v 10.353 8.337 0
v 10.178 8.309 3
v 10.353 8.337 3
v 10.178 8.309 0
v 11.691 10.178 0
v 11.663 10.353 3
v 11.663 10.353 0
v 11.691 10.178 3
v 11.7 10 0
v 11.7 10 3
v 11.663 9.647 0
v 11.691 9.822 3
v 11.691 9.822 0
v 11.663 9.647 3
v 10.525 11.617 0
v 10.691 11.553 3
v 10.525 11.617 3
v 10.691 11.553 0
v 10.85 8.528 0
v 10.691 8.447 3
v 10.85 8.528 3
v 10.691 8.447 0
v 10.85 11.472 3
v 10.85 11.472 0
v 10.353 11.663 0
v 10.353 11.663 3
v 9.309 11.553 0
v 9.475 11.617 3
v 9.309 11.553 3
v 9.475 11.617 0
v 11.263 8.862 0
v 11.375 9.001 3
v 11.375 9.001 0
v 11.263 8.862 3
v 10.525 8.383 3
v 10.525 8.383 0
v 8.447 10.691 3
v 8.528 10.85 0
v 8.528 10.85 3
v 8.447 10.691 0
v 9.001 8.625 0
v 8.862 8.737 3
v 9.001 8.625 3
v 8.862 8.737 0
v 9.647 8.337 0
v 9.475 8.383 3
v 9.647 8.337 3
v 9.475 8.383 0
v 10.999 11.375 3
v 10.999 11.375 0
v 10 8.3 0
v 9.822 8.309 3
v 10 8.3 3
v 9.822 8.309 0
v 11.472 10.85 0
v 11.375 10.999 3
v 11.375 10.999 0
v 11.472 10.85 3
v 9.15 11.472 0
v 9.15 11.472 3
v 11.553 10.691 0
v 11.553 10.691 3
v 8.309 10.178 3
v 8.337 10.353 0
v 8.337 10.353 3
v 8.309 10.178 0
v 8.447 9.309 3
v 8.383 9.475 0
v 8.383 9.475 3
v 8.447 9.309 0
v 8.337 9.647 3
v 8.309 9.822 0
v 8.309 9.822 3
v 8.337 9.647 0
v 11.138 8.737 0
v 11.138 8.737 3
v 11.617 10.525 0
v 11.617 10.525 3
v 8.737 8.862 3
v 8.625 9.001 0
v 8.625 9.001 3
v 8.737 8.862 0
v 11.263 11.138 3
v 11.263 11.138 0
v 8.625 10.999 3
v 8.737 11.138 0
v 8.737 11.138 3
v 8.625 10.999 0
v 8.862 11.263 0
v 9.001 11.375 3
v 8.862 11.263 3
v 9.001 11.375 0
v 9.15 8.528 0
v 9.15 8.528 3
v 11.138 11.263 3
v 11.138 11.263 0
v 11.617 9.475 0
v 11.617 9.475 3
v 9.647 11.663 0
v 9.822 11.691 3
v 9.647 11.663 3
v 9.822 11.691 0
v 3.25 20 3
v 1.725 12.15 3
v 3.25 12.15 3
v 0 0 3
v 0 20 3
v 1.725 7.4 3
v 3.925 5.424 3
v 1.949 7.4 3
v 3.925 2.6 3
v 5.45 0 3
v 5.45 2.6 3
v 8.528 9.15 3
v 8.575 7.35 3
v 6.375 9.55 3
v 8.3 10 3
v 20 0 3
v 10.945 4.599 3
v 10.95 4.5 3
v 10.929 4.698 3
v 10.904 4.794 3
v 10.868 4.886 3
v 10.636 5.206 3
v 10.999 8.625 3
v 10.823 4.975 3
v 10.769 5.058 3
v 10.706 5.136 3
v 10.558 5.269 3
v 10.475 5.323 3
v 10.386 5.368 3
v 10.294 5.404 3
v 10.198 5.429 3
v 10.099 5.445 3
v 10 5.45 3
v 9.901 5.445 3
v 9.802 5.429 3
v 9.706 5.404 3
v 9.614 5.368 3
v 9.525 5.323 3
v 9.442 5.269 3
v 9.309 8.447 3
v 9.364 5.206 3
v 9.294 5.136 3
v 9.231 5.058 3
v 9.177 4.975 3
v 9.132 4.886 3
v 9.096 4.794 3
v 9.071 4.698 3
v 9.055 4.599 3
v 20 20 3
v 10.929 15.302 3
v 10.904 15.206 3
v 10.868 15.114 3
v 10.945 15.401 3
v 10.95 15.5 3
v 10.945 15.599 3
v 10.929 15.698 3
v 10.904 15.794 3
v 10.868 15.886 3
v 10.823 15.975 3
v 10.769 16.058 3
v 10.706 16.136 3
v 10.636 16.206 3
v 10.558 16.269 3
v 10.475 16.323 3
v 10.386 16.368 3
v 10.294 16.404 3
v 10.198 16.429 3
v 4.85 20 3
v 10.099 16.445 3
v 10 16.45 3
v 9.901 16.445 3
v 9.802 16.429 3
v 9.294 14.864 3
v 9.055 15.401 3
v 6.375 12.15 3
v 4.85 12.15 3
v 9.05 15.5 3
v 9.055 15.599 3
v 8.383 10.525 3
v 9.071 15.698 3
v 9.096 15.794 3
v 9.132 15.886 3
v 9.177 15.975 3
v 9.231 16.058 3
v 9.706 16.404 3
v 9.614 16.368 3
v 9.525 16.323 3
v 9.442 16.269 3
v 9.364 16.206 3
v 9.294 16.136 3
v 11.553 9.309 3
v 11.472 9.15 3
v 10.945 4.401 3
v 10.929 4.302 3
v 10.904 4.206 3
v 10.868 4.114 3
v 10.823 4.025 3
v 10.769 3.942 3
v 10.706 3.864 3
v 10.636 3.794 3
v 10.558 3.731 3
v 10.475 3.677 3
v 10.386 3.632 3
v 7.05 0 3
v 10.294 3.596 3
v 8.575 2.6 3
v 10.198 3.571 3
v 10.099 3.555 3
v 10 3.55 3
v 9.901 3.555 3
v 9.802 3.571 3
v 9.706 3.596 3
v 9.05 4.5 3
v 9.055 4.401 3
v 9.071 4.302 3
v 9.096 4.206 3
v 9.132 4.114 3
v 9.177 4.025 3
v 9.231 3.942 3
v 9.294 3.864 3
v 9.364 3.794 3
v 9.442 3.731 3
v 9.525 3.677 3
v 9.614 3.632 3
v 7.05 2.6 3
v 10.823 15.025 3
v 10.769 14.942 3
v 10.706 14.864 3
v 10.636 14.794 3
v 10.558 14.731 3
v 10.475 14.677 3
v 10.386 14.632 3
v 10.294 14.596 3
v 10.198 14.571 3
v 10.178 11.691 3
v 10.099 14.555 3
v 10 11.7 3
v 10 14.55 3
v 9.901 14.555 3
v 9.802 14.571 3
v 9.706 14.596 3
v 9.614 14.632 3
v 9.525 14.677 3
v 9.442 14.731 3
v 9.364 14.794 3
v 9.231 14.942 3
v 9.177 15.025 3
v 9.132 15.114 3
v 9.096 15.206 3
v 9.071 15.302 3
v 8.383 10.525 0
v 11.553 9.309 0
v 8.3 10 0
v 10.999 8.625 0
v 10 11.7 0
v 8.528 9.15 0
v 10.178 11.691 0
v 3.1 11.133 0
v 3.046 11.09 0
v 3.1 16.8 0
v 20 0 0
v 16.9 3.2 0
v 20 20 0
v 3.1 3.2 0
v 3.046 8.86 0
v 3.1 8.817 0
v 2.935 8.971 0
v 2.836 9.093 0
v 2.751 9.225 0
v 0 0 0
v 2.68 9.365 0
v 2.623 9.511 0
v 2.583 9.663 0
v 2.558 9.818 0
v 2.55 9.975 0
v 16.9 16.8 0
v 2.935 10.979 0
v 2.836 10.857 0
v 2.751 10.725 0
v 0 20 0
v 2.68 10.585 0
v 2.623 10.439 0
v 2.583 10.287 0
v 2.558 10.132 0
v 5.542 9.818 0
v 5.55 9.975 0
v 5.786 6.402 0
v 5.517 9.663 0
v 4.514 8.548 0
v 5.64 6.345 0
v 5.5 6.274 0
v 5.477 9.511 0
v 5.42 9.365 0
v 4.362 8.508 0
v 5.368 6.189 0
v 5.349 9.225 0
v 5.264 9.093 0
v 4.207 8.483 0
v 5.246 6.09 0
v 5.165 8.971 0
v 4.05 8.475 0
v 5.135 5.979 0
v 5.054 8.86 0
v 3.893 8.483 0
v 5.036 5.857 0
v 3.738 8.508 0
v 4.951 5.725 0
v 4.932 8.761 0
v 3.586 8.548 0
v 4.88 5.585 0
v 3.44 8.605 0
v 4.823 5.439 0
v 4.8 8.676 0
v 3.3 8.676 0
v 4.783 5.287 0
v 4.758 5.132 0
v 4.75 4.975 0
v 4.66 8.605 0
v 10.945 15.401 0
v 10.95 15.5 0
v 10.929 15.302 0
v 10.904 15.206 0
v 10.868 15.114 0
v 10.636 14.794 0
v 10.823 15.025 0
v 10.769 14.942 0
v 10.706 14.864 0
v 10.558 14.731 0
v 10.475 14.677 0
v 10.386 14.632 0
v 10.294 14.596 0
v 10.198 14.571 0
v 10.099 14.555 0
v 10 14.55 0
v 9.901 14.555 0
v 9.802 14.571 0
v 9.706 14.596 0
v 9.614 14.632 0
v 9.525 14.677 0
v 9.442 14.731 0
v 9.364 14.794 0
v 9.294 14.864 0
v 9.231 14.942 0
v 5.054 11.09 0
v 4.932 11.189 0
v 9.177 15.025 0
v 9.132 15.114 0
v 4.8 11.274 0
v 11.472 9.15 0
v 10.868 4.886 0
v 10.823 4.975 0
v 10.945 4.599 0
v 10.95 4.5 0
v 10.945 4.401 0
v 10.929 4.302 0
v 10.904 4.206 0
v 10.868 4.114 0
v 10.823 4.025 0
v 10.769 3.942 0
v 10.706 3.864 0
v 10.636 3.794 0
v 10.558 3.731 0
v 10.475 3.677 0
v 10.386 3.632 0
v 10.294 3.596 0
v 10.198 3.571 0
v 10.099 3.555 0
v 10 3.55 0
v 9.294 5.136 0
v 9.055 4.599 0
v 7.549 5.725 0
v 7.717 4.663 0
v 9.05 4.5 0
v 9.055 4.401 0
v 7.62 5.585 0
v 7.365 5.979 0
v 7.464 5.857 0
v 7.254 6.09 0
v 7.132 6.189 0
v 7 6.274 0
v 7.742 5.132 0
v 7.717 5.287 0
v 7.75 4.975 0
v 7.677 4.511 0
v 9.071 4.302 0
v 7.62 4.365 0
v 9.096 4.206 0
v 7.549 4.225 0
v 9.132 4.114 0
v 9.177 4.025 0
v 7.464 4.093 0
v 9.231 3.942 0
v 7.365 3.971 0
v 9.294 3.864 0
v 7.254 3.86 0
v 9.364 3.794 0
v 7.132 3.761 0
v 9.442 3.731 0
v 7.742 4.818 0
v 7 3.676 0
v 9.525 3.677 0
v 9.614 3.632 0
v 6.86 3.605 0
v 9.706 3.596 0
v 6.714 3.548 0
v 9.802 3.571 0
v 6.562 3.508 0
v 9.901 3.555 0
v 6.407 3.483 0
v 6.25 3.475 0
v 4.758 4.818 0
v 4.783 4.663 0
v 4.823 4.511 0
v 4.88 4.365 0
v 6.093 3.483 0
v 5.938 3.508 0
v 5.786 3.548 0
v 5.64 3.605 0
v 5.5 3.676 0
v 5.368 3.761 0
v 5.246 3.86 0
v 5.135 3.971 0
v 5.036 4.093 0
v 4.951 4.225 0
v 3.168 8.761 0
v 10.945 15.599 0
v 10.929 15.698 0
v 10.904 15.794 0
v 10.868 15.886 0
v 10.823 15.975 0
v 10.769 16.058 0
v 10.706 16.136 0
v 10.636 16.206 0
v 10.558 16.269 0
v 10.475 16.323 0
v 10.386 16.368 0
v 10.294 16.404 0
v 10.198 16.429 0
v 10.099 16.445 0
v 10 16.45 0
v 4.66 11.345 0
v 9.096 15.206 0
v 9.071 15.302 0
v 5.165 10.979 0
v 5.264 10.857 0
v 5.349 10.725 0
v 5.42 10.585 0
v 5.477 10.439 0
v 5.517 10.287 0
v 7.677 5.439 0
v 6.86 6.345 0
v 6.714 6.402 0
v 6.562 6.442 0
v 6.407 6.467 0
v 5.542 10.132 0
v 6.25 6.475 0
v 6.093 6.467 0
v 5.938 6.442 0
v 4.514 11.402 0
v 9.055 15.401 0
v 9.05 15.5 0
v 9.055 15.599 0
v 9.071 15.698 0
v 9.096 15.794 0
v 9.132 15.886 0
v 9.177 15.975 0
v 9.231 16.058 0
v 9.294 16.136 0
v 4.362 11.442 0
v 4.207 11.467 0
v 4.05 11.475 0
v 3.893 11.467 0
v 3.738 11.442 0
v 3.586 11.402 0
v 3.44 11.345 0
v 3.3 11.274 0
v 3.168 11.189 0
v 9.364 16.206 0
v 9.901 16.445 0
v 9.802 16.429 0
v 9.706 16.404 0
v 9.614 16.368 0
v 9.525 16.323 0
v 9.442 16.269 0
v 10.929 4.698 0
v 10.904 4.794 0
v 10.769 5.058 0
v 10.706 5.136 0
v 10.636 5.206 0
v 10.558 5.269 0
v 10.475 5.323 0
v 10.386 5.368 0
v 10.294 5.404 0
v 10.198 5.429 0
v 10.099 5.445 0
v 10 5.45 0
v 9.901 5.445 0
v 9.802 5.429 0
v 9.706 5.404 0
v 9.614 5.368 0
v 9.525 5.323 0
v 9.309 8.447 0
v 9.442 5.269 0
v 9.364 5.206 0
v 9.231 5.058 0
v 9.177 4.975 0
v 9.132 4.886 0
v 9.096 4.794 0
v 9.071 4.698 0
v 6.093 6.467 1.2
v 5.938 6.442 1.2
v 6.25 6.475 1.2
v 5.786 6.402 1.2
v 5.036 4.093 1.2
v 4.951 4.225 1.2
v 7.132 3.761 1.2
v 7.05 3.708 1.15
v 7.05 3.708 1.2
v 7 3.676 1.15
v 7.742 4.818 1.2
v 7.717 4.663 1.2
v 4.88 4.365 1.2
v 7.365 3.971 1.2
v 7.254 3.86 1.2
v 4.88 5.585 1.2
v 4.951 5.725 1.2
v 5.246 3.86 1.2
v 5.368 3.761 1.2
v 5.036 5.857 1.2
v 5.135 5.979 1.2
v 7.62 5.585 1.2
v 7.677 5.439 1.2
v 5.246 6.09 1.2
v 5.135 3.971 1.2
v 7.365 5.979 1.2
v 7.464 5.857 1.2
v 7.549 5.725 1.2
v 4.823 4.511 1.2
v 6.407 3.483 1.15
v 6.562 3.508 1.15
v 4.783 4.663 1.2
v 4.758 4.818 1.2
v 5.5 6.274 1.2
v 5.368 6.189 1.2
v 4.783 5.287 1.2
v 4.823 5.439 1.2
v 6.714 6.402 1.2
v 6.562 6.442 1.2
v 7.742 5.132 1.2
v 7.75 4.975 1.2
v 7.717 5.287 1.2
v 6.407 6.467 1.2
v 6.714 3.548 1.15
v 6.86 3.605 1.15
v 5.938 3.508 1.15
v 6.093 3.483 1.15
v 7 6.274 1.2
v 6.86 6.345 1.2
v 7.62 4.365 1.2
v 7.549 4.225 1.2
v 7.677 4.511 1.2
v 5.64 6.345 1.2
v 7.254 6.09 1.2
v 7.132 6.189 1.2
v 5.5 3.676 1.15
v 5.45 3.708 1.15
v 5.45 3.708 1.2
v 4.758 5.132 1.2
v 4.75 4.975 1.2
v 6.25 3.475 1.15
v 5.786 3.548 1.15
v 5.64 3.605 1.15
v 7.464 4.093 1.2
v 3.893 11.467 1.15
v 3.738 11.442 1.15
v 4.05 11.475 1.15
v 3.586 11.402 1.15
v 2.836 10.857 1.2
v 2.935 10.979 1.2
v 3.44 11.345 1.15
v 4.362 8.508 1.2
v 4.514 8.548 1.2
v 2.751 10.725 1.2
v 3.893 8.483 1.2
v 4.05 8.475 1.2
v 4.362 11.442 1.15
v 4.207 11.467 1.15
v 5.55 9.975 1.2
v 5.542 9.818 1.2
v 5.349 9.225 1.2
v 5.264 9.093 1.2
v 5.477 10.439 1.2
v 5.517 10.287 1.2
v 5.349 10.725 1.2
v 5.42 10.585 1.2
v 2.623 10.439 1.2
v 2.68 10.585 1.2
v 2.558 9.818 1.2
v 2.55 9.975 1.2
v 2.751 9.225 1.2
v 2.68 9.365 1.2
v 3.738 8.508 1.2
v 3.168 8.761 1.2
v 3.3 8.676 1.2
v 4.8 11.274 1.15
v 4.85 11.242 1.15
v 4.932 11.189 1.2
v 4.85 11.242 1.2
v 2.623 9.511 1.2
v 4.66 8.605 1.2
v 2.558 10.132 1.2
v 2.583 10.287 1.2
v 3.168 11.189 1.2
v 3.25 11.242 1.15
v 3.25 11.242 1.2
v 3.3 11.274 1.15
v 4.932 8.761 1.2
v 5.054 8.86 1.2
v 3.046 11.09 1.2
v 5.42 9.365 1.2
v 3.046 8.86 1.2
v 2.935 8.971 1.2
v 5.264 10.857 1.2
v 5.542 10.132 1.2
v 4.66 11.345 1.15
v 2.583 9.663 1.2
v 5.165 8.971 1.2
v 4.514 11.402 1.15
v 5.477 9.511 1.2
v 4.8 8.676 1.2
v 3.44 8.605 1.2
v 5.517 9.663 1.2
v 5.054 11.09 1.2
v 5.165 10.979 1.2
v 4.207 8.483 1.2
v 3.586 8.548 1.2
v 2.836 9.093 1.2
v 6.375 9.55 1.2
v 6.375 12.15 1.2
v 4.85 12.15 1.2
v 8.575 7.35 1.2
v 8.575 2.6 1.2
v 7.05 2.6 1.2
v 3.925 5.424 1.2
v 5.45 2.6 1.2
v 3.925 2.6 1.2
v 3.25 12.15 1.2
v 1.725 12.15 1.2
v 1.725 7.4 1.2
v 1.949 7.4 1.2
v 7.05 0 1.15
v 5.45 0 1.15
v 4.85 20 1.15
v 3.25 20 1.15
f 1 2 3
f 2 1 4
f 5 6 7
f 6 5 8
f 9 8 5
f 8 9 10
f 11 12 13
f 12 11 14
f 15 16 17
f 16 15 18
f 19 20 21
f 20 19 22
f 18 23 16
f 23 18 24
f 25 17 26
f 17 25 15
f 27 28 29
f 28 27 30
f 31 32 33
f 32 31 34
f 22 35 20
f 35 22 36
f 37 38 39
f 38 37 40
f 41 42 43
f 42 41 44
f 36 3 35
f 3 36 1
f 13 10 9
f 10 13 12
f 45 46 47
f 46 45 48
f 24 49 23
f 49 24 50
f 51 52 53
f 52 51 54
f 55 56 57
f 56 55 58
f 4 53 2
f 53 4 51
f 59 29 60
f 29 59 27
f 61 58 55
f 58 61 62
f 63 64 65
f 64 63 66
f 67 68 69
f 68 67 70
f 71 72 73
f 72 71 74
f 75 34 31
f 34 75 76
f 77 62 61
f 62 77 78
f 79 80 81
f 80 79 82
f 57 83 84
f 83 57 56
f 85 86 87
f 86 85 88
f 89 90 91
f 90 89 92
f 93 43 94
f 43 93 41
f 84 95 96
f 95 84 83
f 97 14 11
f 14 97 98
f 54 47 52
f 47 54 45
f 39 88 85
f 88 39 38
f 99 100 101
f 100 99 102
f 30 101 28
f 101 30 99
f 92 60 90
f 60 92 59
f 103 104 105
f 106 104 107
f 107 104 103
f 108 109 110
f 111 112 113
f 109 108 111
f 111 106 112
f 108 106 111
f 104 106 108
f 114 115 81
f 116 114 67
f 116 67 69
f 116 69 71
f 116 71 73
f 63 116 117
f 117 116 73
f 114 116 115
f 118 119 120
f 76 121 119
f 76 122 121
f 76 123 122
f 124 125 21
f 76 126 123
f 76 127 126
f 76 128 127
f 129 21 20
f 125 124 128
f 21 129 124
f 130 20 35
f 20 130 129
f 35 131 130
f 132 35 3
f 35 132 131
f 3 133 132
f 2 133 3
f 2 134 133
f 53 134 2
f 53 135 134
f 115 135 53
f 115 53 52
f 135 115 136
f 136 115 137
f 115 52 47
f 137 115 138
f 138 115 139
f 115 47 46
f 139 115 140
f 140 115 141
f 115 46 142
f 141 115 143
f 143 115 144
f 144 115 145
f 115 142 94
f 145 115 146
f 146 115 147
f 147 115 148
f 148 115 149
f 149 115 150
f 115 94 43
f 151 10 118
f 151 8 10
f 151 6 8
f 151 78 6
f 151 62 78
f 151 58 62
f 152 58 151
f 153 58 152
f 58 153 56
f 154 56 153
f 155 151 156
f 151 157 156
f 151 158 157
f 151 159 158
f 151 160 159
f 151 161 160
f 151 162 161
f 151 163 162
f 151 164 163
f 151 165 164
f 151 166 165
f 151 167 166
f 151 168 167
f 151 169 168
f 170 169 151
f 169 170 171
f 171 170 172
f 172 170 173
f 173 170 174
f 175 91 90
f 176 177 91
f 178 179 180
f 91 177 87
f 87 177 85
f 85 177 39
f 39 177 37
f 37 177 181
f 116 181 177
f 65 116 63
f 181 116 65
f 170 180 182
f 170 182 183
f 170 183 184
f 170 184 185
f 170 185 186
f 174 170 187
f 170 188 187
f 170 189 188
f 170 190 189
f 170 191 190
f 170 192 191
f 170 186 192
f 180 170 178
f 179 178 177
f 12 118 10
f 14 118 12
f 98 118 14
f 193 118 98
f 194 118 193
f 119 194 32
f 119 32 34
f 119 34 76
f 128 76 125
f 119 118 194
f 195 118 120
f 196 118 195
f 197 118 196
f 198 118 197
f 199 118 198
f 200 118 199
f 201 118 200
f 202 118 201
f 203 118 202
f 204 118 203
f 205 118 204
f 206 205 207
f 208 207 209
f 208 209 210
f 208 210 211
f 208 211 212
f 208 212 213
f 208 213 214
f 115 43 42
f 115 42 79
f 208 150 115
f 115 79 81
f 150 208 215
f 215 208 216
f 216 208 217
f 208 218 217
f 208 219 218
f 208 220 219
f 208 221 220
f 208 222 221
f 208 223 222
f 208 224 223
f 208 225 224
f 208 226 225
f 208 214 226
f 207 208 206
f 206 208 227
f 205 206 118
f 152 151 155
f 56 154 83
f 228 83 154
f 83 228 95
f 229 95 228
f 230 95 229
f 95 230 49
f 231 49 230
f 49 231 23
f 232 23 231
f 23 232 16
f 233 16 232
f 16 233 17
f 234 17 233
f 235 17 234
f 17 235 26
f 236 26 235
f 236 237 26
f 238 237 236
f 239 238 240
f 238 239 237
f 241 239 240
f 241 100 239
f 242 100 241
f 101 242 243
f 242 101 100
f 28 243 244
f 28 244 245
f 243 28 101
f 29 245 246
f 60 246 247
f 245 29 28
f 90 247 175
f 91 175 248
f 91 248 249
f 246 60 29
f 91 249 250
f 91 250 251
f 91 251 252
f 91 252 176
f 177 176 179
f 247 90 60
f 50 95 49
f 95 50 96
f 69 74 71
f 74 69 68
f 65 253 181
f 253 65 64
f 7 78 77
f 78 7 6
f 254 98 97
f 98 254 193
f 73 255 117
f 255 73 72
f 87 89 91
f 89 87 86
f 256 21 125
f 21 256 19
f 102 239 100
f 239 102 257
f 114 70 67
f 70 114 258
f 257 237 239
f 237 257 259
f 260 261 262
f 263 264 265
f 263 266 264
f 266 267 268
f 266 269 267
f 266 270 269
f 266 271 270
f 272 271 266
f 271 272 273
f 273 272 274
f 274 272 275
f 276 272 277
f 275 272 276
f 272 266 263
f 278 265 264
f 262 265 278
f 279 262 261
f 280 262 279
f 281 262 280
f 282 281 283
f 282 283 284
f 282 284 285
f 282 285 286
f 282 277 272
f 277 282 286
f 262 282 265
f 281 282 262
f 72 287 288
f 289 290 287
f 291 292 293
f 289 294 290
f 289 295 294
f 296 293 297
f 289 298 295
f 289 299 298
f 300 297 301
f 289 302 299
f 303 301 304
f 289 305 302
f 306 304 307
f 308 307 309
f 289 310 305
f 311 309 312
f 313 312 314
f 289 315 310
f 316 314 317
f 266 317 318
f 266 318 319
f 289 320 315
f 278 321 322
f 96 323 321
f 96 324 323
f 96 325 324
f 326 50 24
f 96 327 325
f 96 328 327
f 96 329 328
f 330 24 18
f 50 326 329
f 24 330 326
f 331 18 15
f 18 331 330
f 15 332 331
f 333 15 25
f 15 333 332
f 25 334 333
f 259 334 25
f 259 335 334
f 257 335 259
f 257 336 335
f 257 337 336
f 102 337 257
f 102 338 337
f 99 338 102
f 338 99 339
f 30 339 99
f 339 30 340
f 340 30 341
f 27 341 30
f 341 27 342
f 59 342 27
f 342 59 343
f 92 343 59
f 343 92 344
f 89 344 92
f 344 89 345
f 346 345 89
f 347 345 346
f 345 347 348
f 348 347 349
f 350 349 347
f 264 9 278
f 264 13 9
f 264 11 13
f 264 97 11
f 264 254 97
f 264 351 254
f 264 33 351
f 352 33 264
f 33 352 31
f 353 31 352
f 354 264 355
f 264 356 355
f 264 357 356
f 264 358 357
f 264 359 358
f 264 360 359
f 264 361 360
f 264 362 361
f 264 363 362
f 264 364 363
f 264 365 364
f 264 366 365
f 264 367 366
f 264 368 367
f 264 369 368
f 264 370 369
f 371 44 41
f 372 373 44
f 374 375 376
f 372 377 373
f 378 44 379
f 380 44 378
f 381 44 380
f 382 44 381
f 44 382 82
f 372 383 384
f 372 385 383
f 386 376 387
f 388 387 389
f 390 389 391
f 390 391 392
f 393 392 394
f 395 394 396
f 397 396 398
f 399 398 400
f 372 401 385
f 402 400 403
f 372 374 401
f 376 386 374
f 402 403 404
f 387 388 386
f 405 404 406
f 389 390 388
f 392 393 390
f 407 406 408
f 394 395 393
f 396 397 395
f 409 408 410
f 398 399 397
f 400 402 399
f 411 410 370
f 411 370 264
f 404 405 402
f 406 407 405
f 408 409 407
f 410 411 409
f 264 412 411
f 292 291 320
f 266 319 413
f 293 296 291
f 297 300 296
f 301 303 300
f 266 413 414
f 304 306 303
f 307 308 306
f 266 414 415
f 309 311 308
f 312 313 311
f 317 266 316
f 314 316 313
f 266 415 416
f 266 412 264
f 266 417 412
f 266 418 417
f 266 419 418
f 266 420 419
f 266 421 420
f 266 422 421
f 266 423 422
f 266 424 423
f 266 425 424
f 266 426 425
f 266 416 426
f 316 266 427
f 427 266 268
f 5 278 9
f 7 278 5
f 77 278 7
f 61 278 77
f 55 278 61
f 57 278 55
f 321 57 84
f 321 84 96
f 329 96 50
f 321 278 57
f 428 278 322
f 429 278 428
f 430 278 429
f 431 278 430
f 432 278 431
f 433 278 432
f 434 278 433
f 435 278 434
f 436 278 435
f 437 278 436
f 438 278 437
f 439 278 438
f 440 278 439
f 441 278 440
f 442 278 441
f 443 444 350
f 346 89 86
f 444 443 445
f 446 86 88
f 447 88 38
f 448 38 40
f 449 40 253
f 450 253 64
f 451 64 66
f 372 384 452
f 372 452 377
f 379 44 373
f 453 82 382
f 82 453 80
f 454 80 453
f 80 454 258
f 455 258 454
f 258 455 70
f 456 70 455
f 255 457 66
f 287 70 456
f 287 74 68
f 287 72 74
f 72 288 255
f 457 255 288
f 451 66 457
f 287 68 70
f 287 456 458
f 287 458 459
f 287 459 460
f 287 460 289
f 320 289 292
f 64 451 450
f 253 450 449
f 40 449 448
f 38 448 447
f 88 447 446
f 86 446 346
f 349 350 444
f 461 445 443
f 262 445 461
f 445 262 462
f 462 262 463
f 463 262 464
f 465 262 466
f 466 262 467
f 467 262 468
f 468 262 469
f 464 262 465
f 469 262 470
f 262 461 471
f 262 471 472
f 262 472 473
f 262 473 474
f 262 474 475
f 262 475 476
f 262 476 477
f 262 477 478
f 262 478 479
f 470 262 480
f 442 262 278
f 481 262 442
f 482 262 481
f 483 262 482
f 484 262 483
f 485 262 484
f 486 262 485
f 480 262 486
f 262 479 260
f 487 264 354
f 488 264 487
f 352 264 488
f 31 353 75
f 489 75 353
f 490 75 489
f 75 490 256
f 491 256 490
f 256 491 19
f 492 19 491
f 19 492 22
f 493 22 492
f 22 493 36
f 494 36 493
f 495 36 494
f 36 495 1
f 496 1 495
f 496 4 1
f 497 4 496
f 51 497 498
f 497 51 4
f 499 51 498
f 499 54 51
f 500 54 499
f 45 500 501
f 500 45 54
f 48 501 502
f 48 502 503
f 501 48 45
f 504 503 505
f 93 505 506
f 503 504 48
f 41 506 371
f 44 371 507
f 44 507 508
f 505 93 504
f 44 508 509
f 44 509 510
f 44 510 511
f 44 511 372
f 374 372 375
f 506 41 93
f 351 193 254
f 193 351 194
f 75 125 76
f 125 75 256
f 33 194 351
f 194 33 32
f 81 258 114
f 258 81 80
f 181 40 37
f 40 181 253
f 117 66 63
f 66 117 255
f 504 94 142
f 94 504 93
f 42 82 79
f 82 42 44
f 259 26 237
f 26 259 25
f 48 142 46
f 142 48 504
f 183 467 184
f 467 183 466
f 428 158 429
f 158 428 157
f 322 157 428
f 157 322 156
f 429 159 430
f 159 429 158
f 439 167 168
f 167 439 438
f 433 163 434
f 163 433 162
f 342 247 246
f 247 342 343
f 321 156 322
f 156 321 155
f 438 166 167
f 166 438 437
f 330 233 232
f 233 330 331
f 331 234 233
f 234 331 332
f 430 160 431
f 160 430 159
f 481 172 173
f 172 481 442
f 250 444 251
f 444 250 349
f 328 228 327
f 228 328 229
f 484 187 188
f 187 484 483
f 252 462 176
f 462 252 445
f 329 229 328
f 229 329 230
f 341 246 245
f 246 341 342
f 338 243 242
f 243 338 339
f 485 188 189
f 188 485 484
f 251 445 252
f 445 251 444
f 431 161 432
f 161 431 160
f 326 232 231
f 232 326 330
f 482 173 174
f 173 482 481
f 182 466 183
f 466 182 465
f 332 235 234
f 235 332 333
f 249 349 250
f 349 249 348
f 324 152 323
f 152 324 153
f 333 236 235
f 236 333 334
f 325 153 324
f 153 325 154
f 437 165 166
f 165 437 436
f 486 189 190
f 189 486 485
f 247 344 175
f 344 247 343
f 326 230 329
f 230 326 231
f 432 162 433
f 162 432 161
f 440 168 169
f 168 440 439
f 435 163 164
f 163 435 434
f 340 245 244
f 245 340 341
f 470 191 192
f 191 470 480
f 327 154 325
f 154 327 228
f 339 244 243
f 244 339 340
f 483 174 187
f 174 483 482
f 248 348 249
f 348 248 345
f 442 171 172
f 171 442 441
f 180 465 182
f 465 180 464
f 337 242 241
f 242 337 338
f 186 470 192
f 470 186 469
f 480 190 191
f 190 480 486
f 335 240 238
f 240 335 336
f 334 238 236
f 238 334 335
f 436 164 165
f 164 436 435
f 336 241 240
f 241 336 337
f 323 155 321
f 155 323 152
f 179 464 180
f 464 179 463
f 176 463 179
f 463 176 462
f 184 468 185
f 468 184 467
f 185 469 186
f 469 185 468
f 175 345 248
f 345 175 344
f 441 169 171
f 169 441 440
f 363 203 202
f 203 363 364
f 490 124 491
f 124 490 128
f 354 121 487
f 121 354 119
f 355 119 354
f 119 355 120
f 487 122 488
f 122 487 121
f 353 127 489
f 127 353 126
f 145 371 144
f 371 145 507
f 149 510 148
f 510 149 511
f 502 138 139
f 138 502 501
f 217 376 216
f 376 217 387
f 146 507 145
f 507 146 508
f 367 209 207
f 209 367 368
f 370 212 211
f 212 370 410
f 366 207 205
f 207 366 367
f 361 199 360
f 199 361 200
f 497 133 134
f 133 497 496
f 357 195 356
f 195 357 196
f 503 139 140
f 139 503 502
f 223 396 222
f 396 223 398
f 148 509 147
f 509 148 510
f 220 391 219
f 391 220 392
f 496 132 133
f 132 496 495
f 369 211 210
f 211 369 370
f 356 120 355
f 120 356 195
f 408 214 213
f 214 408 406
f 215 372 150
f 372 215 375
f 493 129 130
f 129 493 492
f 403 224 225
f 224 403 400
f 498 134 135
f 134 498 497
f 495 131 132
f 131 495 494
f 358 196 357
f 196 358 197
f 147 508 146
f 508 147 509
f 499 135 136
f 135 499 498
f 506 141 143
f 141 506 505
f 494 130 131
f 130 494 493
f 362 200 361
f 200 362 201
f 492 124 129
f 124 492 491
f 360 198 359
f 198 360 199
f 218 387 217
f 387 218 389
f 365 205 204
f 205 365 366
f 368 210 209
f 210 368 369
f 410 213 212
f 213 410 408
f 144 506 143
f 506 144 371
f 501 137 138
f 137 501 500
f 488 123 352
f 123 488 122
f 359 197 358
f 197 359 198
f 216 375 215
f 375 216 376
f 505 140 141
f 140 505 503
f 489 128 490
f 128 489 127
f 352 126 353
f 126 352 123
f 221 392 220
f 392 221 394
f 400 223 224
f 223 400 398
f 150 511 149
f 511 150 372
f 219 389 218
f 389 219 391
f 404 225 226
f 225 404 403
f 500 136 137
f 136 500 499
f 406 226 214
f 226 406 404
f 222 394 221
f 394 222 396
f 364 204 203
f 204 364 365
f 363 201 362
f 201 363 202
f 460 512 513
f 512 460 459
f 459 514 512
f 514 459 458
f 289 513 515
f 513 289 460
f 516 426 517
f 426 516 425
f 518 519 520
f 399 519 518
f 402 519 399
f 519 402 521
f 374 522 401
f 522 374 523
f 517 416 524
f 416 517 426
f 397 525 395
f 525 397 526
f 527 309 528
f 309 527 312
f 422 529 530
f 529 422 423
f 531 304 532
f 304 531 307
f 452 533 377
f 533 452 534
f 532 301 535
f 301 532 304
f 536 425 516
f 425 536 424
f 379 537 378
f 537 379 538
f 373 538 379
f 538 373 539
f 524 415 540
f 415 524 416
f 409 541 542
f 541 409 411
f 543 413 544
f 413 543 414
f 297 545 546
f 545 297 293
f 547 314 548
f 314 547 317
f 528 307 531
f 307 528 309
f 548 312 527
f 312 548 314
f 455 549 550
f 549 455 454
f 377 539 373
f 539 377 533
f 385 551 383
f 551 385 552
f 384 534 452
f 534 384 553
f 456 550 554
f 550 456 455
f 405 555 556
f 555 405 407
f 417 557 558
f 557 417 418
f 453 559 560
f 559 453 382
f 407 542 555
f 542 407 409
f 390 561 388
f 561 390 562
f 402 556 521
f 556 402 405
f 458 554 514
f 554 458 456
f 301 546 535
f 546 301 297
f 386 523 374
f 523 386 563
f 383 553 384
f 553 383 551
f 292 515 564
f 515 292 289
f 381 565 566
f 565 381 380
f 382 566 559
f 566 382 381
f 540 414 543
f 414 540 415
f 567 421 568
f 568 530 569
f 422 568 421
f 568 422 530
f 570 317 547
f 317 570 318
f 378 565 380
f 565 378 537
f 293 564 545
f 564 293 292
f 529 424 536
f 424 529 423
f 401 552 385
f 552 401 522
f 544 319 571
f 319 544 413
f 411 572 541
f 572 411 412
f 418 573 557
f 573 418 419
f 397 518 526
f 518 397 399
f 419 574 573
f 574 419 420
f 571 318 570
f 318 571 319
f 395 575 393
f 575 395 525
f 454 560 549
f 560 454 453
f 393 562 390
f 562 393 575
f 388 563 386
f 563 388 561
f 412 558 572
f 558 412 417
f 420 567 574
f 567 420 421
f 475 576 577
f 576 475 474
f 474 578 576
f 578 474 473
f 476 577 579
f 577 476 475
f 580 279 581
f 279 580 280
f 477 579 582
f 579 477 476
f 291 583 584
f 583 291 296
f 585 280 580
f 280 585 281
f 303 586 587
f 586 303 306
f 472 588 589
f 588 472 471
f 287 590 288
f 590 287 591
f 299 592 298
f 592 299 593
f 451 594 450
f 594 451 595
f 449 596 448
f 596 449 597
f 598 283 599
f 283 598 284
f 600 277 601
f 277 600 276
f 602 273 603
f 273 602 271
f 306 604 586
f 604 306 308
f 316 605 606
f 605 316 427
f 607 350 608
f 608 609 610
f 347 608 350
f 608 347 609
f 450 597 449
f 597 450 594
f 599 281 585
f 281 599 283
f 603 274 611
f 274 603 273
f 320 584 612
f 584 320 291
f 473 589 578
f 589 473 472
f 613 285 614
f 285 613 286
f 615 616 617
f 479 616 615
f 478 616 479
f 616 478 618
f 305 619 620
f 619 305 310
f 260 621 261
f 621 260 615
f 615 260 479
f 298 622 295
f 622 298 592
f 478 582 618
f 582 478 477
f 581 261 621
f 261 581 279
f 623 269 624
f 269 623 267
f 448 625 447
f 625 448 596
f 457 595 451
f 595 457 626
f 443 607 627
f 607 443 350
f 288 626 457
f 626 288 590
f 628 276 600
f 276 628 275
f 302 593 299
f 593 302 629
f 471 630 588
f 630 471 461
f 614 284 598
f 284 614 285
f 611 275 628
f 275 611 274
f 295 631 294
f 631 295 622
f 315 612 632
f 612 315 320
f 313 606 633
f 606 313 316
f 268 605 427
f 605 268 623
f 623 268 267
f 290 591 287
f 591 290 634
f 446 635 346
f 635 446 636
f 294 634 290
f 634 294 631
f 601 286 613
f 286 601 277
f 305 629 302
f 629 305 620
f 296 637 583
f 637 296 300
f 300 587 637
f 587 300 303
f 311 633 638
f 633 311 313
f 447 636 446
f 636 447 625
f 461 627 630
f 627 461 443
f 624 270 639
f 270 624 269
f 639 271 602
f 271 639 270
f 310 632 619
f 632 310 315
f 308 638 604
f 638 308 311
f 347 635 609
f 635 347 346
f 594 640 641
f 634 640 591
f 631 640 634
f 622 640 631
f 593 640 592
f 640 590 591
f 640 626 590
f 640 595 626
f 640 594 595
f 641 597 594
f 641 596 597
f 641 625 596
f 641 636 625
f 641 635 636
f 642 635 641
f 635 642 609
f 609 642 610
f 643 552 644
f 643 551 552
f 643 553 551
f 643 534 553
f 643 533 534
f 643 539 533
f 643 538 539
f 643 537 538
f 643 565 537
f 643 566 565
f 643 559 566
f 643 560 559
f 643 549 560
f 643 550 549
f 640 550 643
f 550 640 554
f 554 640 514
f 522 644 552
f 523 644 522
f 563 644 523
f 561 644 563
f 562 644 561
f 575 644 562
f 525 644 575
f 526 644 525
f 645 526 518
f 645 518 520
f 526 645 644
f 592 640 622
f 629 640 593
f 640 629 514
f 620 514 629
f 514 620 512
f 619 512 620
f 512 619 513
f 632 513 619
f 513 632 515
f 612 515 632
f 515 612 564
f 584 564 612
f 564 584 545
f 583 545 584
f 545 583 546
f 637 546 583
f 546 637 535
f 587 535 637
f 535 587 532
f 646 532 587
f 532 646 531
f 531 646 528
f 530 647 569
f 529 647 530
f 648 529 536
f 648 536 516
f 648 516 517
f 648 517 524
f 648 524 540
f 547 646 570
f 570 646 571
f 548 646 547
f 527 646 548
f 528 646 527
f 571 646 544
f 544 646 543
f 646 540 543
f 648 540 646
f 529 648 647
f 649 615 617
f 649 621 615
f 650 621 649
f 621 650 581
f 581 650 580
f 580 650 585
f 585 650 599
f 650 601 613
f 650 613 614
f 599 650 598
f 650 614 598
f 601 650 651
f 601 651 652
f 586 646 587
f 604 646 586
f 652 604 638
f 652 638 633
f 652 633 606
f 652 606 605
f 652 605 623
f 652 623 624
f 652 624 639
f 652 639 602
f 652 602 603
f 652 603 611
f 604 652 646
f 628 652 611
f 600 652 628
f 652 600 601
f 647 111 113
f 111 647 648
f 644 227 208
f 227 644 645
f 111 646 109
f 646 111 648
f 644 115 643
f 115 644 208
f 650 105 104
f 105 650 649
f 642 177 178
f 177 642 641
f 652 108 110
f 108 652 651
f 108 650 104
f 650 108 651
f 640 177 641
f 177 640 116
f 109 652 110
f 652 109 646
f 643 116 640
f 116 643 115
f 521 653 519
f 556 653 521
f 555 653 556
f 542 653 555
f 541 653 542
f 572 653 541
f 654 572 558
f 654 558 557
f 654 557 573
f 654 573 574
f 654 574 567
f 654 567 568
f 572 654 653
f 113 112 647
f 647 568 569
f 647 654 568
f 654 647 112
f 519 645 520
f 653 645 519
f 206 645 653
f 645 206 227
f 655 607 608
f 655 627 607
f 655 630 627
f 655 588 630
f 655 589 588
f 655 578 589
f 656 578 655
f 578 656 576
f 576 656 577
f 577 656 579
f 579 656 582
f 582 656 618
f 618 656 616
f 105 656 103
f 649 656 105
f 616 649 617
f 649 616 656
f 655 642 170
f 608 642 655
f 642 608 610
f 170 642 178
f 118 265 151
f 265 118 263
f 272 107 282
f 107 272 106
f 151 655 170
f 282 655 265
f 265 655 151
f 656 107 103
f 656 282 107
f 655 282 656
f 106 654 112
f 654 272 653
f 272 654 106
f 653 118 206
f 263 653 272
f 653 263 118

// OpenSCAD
$fn=$preview ? 10 : 60;

//hotswap
cyl_h=3.05;
cyl_d=3;

base_x=4.75;
base_x_sum=9.55;
base_y=4.65;
base_y_sum=6.85;
base_z=1.8;

clip_x=1.68;
clip_y=(13.15-9.95)/2;
clip_z=1.85;

//based on:
//https://www.kailhswitch.com/Content/upload/pdf/201915927/CPG135001D03_-_White_Clicky_Choc.pdf  
module kailh_choc_switch(){
    color("orange")
    union(){
        cube([15,15,0.8]);
        translate([0.6,0.7,0.8])
        cube([13.8,13.6,2.2]);
        
        translate([7.5,7.5,3]){
            cylinder(h=3,d=3.4);
            
            translate([0,+5.5,0])
            cylinder(h=3,d=1.9);
            translate([0,-5.5,0])
            cylinder(h=3,d=1.9);
            
            //contacts
            translate([-5.9,0,0])
            cylinder(h=3,d=1.2);
            translate([-3.8,-5,0])
            cylinder(h=3,d=1.2);
        }
    }
}

//based on:
//https://www.kailhswitch.com/Content/upload/pdf/202115927/CPG135001S30-data-sheet.pdf
module kailh_hot_swap_choc(extend_cables=0){


    //fuck
    mirror([0,0,1])
    union(){
    //plastic
    color("darkgray"){
        cube([base_x,base_y,base_z]);
        
        translate([base_x_sum-base_x,base_y_sum-base_y,0])
        cube([base_x,base_y,base_z]);
        
        translate([base_x/2,base_y/2,0]){
            cylinder(h=cyl_h,d=cyl_d);
            translate([5,2.2,0])
            cylinder(h=cyl_h,d=cyl_d);
        }
        translate([base_x,0,0])
        rotate([0,0,45])
        cube([base_x,base_y,base_z]);
    }
    
    //metal
    color("gray"){
        translate([-clip_x-extend_cables,base_y/2-clip_y/2,0])
        cube([clip_x+base_y/2+extend_cables, clip_y, clip_z]);
        translate([base_x_sum-base_y/2,base_y_sum-base_y/2-clip_y/2,0])
        cube([clip_x+base_y/2+extend_cables, clip_y, clip_z]);
    }
    }
}

difference(){
cube([20,20,3]);
translate([2.5,2.5,0]){
    translate([0,0,-3])
    kailh_choc_switch();

    translate([7.5-3.8+base_y/2+.05,0.1,3])
    rotate([0,0,90])
    kailh_hot_swap_choc(10);
    }
}


//kailh_choc_switch();
